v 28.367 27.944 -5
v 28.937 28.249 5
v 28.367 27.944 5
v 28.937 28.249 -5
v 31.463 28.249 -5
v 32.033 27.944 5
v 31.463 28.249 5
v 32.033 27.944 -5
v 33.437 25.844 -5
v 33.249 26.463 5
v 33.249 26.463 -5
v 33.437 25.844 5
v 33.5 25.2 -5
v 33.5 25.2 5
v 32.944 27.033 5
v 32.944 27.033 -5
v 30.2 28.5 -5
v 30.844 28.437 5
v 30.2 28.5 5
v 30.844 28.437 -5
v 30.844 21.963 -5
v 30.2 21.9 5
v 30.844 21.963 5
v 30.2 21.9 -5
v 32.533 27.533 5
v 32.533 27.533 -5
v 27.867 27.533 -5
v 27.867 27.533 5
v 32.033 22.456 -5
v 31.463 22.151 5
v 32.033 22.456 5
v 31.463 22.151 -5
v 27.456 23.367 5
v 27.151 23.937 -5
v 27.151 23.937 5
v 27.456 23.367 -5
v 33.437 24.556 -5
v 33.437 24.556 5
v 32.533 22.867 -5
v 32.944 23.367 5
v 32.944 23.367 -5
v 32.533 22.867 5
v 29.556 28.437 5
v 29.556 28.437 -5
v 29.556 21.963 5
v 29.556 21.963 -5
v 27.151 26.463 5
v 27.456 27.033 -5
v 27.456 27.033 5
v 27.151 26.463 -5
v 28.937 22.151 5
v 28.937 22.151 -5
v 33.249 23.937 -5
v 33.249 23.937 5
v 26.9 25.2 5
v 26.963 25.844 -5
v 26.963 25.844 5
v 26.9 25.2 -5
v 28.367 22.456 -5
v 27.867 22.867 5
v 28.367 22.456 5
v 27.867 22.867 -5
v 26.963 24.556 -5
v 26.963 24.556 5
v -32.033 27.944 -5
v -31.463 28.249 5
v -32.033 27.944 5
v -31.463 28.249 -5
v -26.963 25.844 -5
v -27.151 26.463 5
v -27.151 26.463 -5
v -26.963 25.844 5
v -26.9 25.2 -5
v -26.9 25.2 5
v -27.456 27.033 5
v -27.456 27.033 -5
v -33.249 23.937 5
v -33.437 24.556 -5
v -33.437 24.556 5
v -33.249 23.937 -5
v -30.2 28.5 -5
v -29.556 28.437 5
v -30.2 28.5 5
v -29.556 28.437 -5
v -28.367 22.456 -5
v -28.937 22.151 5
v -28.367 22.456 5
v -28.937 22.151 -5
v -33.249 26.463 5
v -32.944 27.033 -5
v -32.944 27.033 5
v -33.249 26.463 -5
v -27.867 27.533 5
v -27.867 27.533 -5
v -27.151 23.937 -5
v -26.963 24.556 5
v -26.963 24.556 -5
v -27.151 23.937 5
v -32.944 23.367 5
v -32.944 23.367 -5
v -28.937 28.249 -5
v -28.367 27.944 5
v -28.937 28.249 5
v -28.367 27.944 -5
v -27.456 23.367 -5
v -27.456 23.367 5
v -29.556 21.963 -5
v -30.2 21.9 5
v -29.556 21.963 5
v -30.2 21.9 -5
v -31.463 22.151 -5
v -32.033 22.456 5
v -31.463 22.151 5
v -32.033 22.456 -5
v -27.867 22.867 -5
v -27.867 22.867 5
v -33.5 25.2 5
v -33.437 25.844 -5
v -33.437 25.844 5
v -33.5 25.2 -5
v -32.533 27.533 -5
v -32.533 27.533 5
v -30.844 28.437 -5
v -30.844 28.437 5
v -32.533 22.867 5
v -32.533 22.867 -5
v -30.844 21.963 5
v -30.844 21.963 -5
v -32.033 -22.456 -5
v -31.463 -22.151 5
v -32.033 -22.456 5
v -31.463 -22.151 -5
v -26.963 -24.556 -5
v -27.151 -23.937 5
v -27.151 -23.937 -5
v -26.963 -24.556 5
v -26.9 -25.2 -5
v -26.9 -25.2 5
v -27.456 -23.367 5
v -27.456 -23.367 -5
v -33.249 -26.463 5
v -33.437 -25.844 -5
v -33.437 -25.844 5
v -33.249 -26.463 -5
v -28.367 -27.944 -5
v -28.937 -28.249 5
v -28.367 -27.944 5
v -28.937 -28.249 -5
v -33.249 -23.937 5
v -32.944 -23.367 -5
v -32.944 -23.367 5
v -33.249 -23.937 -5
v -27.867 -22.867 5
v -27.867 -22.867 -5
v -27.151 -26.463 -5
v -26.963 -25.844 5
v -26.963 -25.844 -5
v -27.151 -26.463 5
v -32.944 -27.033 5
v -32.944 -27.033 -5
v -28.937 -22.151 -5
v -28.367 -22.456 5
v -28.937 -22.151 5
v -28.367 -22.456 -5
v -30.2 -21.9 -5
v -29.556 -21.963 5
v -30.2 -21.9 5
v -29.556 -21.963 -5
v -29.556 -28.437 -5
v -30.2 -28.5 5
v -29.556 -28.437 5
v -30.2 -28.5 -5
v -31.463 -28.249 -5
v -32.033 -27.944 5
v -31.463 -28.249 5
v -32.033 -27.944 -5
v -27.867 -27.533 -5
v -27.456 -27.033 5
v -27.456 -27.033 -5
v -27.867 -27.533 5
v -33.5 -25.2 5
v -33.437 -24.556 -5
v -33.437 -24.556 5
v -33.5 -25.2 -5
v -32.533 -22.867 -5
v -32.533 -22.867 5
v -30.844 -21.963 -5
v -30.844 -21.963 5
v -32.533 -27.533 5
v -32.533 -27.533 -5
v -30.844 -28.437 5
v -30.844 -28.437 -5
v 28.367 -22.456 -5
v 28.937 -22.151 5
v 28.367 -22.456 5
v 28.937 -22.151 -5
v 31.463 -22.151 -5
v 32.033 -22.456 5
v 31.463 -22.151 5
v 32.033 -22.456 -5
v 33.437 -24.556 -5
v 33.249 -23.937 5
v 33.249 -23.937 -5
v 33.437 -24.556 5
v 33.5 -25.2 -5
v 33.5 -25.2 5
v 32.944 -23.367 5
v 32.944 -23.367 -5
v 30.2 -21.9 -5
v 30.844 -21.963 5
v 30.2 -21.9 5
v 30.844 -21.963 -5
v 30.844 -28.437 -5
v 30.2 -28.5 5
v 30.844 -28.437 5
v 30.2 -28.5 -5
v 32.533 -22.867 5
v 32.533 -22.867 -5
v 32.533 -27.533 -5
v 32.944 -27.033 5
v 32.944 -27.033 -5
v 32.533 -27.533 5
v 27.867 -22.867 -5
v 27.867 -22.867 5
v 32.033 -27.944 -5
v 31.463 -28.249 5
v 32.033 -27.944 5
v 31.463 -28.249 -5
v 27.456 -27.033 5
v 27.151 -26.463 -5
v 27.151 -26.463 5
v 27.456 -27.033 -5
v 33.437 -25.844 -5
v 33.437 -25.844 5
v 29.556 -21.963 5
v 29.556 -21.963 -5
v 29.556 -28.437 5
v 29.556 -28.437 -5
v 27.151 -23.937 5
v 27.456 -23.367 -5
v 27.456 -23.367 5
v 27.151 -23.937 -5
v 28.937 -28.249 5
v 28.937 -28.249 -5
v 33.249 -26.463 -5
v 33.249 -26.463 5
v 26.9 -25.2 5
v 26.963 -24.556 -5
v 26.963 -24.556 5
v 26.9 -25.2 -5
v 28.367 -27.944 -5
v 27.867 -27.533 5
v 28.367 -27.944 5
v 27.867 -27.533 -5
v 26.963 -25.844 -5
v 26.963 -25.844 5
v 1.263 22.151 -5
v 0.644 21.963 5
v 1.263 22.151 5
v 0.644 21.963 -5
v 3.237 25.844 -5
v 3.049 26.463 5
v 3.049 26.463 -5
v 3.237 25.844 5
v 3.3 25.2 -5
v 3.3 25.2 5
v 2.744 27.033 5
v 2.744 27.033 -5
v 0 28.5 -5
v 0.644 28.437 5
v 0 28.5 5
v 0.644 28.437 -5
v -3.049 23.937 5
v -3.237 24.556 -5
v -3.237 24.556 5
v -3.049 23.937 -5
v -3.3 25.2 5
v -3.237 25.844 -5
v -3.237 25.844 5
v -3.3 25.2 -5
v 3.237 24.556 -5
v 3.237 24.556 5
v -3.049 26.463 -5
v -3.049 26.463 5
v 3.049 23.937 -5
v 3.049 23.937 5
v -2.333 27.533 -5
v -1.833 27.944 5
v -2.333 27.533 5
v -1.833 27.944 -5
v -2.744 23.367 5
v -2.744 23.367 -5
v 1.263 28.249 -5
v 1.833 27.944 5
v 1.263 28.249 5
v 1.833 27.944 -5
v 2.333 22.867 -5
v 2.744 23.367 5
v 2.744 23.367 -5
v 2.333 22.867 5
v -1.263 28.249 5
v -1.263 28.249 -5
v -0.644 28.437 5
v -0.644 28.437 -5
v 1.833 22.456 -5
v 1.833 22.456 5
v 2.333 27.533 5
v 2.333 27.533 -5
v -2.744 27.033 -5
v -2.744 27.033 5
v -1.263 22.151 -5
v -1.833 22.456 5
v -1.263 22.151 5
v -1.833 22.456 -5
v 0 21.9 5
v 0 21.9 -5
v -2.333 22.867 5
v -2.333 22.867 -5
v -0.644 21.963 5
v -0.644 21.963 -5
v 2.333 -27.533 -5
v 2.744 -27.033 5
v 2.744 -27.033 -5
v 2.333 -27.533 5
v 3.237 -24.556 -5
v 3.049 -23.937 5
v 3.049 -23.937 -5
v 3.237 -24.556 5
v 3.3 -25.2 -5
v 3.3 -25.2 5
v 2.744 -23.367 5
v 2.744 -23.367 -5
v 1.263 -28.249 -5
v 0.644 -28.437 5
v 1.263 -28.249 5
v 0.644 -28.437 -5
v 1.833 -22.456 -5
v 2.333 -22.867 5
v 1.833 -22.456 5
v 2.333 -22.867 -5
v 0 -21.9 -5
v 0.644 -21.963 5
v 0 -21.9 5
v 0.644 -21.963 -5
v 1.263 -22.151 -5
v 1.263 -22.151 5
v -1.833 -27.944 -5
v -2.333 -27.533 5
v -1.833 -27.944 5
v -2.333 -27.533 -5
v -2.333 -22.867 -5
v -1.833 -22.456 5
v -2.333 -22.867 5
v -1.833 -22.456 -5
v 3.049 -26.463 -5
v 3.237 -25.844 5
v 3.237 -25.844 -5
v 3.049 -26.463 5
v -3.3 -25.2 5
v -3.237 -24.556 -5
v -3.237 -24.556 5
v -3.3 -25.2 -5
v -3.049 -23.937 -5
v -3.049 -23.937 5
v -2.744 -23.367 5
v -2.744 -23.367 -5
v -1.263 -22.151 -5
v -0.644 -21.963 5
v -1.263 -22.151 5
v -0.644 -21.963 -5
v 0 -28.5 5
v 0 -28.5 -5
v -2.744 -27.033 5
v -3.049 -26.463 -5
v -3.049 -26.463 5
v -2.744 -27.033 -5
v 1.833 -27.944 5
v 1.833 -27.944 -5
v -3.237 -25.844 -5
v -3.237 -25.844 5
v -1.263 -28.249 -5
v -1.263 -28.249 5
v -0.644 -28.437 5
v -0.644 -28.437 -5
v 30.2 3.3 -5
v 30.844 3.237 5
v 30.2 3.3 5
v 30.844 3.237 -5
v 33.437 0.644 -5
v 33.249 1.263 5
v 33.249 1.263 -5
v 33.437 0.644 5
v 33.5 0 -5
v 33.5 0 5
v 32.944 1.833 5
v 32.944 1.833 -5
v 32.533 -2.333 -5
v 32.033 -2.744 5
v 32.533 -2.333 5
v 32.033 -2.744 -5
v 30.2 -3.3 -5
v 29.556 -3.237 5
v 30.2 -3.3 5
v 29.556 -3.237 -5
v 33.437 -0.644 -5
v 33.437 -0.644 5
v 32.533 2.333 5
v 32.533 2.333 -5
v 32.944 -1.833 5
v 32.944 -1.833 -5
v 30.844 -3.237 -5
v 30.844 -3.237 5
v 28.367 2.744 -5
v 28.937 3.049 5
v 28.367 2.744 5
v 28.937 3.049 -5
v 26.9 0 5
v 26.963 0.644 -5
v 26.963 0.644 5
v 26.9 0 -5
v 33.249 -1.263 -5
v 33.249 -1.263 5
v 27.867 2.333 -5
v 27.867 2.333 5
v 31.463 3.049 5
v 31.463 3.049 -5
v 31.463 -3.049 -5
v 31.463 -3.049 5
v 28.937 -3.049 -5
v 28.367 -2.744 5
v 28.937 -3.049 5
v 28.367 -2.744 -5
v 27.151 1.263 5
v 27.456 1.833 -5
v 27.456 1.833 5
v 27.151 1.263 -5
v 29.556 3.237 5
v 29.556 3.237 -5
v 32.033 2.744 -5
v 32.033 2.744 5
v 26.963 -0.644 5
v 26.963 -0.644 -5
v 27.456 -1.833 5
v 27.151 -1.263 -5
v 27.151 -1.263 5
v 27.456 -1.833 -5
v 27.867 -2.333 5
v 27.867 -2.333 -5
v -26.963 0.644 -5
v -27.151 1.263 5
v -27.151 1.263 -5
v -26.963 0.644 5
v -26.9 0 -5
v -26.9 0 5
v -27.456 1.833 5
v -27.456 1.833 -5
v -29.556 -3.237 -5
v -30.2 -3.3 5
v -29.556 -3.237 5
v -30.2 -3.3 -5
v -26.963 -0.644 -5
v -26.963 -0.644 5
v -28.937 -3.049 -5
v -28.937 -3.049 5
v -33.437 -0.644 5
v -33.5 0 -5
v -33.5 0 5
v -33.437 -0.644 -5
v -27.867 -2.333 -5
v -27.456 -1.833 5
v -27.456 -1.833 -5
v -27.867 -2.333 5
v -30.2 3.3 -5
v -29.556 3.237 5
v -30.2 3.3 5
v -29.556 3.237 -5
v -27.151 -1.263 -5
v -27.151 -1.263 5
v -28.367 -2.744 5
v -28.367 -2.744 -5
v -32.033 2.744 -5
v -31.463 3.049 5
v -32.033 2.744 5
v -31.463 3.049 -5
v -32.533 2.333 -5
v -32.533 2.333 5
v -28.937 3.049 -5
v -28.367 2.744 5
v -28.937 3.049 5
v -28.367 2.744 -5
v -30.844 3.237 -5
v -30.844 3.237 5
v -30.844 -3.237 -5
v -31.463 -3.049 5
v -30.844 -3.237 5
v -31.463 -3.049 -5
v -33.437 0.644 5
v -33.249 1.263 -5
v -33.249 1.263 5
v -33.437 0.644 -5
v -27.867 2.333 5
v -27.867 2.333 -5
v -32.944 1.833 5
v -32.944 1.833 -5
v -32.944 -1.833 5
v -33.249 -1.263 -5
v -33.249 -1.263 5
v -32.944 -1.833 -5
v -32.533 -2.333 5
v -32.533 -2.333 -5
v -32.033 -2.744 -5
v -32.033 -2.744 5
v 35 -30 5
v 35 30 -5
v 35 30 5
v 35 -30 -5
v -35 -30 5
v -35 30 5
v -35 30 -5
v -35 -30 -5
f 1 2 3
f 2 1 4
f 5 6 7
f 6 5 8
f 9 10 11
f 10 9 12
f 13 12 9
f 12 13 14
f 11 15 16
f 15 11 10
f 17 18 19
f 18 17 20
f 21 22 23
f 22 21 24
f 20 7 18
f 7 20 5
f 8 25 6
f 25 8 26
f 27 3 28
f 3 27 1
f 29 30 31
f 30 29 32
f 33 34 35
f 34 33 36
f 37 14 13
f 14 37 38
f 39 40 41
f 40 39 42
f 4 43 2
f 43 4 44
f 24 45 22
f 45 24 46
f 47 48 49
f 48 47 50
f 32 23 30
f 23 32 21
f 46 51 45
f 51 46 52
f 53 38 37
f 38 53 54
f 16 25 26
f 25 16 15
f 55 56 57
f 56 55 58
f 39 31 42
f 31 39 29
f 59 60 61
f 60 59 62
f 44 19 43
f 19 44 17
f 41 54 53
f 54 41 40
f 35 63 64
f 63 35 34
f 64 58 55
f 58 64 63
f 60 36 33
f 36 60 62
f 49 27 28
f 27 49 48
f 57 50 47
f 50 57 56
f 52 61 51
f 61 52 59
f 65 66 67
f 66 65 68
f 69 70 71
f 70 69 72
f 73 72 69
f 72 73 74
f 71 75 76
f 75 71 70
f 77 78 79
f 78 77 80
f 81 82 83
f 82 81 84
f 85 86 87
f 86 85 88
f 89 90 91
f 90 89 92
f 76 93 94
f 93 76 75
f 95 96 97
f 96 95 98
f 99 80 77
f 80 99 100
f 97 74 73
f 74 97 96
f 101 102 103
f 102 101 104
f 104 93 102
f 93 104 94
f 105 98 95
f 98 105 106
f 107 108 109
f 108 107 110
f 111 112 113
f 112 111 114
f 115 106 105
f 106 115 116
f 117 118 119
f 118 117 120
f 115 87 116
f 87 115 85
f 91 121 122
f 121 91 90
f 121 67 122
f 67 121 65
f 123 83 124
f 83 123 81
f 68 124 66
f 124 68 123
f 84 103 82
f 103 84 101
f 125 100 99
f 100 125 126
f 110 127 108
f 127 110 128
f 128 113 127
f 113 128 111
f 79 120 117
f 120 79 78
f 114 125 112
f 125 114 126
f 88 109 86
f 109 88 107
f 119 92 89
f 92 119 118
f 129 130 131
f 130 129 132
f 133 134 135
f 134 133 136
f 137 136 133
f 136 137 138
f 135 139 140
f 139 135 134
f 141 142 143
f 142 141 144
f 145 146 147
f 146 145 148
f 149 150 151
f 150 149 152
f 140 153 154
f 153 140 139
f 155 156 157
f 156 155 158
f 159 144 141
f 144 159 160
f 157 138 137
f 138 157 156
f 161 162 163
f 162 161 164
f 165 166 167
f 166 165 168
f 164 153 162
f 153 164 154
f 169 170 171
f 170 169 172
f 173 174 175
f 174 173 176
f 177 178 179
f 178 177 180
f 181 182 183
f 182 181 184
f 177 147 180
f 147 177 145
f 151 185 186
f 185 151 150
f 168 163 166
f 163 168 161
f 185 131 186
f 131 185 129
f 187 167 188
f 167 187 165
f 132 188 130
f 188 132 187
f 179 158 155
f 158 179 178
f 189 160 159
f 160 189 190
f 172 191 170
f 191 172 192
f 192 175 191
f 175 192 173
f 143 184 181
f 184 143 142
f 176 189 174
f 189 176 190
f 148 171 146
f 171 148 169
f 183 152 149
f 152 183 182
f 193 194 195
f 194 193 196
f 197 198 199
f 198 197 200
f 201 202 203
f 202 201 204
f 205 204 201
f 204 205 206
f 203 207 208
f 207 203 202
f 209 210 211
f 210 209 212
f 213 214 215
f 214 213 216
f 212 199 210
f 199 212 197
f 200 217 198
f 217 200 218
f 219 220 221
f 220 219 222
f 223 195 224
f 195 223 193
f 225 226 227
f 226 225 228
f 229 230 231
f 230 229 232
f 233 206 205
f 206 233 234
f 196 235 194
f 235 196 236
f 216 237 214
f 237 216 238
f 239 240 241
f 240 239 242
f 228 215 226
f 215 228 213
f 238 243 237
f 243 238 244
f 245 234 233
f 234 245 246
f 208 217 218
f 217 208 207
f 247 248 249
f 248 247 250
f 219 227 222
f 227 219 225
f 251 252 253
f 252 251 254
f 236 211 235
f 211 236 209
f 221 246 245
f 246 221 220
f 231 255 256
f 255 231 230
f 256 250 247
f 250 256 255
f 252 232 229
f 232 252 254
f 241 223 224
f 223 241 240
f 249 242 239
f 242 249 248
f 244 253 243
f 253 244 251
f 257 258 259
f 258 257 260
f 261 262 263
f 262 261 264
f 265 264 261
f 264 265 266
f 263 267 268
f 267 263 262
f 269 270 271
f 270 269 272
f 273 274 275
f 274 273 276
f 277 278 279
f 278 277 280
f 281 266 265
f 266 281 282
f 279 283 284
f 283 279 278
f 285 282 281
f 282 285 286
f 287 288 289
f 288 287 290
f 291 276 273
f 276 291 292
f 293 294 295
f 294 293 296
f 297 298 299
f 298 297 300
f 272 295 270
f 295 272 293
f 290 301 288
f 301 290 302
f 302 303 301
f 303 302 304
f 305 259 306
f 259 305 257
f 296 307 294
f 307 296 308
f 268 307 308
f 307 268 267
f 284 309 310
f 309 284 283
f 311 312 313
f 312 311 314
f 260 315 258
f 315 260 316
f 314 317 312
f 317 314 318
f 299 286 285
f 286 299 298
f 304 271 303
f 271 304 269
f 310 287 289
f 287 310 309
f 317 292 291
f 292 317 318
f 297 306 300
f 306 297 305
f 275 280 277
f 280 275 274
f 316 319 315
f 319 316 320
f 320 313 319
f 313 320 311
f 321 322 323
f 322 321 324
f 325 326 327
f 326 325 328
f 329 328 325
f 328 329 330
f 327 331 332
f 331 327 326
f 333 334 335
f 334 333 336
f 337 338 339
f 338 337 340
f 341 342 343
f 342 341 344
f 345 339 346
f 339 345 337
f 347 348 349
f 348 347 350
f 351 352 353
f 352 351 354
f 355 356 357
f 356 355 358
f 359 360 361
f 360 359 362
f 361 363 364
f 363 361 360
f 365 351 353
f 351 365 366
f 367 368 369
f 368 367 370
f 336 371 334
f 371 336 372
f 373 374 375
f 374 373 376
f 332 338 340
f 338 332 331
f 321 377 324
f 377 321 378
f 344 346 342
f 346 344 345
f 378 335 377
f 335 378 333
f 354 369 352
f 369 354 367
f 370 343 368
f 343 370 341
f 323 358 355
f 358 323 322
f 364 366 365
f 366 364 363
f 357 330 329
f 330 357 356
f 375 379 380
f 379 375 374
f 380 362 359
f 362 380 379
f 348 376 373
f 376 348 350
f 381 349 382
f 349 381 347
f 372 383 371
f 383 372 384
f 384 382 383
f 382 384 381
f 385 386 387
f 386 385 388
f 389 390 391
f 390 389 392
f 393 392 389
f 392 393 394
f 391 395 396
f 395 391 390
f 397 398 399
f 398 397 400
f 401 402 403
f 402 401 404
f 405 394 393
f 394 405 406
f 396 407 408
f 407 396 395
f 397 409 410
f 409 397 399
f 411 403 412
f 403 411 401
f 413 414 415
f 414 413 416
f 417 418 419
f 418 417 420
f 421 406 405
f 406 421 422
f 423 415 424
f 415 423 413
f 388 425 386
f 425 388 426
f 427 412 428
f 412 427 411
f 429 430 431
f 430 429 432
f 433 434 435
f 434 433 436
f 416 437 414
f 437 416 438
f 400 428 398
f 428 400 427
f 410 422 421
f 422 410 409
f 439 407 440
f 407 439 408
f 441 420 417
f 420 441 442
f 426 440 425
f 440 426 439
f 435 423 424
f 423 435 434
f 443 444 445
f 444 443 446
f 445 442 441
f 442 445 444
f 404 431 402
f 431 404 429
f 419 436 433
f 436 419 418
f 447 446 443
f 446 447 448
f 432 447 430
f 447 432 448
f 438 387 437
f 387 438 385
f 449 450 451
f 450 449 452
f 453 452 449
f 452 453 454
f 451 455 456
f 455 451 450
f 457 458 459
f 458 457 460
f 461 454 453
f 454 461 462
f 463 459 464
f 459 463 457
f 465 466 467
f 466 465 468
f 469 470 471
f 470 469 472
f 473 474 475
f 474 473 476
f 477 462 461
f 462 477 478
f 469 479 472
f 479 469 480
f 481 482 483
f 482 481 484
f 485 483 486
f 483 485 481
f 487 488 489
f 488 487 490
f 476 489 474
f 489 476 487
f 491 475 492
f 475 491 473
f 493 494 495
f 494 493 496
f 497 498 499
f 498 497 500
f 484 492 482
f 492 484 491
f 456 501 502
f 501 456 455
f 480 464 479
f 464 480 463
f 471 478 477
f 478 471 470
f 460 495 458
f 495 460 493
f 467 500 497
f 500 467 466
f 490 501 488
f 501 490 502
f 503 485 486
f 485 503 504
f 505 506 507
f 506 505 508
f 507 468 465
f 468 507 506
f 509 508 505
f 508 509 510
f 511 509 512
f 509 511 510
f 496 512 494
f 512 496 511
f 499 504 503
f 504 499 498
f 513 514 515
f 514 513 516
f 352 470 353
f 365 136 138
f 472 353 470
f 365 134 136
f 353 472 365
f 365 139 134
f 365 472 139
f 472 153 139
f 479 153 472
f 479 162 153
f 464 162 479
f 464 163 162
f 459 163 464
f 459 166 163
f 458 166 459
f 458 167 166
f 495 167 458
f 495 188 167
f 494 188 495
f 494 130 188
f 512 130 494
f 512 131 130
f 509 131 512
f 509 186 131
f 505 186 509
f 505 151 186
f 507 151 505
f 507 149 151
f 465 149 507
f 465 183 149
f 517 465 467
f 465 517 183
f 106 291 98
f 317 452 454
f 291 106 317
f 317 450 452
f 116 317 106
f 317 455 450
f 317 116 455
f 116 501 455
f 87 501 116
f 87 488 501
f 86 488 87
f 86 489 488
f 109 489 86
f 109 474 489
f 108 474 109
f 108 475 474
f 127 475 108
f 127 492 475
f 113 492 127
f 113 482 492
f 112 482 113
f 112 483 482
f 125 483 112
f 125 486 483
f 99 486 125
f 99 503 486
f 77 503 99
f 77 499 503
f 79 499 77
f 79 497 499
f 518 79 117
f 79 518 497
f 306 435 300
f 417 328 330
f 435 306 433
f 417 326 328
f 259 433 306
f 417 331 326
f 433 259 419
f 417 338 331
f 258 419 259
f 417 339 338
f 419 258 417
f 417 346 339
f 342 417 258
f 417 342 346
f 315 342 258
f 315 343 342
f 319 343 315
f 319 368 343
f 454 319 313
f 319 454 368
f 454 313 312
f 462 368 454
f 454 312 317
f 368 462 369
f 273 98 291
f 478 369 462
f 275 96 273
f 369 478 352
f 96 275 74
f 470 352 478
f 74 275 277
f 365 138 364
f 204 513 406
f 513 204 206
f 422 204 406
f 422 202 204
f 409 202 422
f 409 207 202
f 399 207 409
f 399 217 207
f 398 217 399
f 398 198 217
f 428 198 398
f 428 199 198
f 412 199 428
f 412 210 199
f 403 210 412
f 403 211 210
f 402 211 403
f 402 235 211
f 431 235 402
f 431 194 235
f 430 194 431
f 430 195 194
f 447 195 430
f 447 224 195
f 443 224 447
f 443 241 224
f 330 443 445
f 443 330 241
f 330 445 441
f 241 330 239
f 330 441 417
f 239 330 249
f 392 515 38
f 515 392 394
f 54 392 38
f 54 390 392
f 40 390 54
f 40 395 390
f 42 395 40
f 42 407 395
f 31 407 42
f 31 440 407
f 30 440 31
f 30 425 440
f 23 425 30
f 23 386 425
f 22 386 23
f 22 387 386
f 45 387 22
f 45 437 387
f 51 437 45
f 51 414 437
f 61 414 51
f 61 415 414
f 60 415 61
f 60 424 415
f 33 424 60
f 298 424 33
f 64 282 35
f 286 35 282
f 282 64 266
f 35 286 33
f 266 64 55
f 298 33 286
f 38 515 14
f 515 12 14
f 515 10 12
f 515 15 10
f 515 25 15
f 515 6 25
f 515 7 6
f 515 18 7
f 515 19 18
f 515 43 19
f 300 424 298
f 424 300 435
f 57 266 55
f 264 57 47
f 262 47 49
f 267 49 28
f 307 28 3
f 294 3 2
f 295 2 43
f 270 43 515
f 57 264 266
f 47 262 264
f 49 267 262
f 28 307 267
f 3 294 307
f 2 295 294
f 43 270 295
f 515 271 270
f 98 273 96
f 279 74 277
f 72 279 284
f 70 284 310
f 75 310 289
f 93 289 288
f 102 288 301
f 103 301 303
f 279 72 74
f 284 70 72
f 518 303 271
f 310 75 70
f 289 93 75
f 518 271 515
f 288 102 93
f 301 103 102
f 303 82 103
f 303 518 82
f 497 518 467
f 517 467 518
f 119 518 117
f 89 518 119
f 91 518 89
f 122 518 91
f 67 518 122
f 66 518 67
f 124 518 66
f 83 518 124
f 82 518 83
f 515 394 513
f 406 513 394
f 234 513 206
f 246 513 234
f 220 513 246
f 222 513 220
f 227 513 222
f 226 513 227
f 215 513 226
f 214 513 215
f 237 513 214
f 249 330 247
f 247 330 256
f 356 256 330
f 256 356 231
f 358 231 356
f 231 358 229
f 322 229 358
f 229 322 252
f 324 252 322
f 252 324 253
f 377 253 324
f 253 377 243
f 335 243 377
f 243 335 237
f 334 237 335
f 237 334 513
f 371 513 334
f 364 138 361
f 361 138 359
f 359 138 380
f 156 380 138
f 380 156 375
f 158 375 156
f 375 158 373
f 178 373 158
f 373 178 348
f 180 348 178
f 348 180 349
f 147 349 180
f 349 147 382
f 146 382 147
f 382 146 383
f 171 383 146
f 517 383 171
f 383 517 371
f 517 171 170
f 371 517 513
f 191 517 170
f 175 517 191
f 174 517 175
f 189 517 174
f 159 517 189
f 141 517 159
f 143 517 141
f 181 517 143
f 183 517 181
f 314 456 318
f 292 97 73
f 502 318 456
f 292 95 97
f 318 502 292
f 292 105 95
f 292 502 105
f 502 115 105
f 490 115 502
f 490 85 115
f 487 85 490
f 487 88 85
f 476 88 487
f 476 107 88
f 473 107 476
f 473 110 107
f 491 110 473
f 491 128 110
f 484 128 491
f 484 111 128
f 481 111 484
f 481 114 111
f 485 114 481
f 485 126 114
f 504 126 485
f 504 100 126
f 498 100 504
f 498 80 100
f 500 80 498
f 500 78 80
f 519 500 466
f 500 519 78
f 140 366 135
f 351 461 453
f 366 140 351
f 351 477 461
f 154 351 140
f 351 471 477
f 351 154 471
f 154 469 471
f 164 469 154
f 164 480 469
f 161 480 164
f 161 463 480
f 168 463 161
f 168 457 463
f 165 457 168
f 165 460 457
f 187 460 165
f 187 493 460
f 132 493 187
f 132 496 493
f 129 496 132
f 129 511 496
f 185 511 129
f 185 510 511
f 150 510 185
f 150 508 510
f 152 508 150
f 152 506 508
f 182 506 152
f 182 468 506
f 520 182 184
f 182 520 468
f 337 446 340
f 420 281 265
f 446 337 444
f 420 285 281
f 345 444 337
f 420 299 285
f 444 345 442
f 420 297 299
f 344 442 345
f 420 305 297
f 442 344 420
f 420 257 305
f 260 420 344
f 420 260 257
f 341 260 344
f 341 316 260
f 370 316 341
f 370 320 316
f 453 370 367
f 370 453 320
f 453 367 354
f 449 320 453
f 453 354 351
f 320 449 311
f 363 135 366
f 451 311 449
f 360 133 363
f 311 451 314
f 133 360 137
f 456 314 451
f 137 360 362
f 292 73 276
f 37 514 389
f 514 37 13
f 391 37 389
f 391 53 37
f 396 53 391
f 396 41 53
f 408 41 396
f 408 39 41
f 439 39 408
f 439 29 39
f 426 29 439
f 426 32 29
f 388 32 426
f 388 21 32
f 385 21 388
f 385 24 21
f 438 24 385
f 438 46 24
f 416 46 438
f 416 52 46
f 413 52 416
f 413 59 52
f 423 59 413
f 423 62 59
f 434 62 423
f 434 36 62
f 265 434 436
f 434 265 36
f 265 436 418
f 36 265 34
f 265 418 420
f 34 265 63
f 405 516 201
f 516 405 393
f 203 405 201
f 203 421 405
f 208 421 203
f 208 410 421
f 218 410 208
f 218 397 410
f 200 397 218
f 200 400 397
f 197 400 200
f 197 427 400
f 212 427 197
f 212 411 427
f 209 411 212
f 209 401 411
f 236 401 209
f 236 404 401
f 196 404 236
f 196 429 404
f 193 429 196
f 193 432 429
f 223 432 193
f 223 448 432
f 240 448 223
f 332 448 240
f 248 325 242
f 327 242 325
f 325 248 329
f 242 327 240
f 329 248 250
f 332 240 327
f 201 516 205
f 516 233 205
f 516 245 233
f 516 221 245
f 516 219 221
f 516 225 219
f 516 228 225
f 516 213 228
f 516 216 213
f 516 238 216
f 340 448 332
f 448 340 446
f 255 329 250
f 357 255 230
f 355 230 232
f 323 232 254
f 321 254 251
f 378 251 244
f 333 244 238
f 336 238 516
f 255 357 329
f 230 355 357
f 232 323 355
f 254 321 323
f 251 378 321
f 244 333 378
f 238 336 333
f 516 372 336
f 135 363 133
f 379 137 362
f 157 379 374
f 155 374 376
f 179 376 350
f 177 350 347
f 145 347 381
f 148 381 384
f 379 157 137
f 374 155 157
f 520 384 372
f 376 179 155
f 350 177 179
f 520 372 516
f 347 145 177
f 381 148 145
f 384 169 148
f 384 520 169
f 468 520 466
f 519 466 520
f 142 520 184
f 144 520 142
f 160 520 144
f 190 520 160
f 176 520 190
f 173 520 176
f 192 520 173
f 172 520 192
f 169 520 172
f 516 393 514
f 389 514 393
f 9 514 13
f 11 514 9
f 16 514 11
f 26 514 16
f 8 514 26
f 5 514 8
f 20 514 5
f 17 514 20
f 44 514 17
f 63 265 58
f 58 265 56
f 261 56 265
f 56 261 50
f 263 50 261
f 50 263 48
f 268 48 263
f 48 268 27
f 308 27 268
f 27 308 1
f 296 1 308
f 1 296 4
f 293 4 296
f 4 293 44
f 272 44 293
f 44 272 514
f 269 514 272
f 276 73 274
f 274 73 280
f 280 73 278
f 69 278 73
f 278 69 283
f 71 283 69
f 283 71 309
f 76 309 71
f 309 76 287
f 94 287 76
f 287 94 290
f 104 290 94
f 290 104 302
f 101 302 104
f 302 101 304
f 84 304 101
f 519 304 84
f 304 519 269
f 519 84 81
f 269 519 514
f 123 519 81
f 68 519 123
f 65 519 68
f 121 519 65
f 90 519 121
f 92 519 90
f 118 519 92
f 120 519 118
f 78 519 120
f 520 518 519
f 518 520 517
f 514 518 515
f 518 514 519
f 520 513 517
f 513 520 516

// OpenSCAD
$fn = 32;

// ----------------------------------------------------------------------
// Corner plate 70 x 60 x 10
// 8 holes, centres taken from the edge offset
// ----------------------------------------------------------------------

// --- parameters (mm) ---
plate = [70, 60, 10];  // overall size (x, y, z)
holes = 8;             // number of holes the drawing asks for
hole_d = 6.6;          // hole diameter
edge = 4.8;            // hole centre offset from the plate edge

// --- derived feature positions (mm) ---
corner_x = plate[0] / 2 - edge;  // = 30.2   corner hole X
corner_y = plate[1] / 2 - edge;  // = 25.2   corner hole Y
feature_centers = [
  [corner_x, corner_y],
  [-corner_x, corner_y],
  [-corner_x, -corner_y],
  [corner_x, -corner_y],
  [0, corner_y],
  [0, -corner_y],
  [corner_x, 0],
  [-corner_x, 0]
];   // hole centres the loop below drills

// plate outline, every hole drilled through with the same cutters
difference() {
  cube(plate, center = true);
  for (centre = feature_centers)
    translate([centre[0], centre[1], 0])
      cylinder(d = hole_d, h = plate[2] + 2, center = true);
}
